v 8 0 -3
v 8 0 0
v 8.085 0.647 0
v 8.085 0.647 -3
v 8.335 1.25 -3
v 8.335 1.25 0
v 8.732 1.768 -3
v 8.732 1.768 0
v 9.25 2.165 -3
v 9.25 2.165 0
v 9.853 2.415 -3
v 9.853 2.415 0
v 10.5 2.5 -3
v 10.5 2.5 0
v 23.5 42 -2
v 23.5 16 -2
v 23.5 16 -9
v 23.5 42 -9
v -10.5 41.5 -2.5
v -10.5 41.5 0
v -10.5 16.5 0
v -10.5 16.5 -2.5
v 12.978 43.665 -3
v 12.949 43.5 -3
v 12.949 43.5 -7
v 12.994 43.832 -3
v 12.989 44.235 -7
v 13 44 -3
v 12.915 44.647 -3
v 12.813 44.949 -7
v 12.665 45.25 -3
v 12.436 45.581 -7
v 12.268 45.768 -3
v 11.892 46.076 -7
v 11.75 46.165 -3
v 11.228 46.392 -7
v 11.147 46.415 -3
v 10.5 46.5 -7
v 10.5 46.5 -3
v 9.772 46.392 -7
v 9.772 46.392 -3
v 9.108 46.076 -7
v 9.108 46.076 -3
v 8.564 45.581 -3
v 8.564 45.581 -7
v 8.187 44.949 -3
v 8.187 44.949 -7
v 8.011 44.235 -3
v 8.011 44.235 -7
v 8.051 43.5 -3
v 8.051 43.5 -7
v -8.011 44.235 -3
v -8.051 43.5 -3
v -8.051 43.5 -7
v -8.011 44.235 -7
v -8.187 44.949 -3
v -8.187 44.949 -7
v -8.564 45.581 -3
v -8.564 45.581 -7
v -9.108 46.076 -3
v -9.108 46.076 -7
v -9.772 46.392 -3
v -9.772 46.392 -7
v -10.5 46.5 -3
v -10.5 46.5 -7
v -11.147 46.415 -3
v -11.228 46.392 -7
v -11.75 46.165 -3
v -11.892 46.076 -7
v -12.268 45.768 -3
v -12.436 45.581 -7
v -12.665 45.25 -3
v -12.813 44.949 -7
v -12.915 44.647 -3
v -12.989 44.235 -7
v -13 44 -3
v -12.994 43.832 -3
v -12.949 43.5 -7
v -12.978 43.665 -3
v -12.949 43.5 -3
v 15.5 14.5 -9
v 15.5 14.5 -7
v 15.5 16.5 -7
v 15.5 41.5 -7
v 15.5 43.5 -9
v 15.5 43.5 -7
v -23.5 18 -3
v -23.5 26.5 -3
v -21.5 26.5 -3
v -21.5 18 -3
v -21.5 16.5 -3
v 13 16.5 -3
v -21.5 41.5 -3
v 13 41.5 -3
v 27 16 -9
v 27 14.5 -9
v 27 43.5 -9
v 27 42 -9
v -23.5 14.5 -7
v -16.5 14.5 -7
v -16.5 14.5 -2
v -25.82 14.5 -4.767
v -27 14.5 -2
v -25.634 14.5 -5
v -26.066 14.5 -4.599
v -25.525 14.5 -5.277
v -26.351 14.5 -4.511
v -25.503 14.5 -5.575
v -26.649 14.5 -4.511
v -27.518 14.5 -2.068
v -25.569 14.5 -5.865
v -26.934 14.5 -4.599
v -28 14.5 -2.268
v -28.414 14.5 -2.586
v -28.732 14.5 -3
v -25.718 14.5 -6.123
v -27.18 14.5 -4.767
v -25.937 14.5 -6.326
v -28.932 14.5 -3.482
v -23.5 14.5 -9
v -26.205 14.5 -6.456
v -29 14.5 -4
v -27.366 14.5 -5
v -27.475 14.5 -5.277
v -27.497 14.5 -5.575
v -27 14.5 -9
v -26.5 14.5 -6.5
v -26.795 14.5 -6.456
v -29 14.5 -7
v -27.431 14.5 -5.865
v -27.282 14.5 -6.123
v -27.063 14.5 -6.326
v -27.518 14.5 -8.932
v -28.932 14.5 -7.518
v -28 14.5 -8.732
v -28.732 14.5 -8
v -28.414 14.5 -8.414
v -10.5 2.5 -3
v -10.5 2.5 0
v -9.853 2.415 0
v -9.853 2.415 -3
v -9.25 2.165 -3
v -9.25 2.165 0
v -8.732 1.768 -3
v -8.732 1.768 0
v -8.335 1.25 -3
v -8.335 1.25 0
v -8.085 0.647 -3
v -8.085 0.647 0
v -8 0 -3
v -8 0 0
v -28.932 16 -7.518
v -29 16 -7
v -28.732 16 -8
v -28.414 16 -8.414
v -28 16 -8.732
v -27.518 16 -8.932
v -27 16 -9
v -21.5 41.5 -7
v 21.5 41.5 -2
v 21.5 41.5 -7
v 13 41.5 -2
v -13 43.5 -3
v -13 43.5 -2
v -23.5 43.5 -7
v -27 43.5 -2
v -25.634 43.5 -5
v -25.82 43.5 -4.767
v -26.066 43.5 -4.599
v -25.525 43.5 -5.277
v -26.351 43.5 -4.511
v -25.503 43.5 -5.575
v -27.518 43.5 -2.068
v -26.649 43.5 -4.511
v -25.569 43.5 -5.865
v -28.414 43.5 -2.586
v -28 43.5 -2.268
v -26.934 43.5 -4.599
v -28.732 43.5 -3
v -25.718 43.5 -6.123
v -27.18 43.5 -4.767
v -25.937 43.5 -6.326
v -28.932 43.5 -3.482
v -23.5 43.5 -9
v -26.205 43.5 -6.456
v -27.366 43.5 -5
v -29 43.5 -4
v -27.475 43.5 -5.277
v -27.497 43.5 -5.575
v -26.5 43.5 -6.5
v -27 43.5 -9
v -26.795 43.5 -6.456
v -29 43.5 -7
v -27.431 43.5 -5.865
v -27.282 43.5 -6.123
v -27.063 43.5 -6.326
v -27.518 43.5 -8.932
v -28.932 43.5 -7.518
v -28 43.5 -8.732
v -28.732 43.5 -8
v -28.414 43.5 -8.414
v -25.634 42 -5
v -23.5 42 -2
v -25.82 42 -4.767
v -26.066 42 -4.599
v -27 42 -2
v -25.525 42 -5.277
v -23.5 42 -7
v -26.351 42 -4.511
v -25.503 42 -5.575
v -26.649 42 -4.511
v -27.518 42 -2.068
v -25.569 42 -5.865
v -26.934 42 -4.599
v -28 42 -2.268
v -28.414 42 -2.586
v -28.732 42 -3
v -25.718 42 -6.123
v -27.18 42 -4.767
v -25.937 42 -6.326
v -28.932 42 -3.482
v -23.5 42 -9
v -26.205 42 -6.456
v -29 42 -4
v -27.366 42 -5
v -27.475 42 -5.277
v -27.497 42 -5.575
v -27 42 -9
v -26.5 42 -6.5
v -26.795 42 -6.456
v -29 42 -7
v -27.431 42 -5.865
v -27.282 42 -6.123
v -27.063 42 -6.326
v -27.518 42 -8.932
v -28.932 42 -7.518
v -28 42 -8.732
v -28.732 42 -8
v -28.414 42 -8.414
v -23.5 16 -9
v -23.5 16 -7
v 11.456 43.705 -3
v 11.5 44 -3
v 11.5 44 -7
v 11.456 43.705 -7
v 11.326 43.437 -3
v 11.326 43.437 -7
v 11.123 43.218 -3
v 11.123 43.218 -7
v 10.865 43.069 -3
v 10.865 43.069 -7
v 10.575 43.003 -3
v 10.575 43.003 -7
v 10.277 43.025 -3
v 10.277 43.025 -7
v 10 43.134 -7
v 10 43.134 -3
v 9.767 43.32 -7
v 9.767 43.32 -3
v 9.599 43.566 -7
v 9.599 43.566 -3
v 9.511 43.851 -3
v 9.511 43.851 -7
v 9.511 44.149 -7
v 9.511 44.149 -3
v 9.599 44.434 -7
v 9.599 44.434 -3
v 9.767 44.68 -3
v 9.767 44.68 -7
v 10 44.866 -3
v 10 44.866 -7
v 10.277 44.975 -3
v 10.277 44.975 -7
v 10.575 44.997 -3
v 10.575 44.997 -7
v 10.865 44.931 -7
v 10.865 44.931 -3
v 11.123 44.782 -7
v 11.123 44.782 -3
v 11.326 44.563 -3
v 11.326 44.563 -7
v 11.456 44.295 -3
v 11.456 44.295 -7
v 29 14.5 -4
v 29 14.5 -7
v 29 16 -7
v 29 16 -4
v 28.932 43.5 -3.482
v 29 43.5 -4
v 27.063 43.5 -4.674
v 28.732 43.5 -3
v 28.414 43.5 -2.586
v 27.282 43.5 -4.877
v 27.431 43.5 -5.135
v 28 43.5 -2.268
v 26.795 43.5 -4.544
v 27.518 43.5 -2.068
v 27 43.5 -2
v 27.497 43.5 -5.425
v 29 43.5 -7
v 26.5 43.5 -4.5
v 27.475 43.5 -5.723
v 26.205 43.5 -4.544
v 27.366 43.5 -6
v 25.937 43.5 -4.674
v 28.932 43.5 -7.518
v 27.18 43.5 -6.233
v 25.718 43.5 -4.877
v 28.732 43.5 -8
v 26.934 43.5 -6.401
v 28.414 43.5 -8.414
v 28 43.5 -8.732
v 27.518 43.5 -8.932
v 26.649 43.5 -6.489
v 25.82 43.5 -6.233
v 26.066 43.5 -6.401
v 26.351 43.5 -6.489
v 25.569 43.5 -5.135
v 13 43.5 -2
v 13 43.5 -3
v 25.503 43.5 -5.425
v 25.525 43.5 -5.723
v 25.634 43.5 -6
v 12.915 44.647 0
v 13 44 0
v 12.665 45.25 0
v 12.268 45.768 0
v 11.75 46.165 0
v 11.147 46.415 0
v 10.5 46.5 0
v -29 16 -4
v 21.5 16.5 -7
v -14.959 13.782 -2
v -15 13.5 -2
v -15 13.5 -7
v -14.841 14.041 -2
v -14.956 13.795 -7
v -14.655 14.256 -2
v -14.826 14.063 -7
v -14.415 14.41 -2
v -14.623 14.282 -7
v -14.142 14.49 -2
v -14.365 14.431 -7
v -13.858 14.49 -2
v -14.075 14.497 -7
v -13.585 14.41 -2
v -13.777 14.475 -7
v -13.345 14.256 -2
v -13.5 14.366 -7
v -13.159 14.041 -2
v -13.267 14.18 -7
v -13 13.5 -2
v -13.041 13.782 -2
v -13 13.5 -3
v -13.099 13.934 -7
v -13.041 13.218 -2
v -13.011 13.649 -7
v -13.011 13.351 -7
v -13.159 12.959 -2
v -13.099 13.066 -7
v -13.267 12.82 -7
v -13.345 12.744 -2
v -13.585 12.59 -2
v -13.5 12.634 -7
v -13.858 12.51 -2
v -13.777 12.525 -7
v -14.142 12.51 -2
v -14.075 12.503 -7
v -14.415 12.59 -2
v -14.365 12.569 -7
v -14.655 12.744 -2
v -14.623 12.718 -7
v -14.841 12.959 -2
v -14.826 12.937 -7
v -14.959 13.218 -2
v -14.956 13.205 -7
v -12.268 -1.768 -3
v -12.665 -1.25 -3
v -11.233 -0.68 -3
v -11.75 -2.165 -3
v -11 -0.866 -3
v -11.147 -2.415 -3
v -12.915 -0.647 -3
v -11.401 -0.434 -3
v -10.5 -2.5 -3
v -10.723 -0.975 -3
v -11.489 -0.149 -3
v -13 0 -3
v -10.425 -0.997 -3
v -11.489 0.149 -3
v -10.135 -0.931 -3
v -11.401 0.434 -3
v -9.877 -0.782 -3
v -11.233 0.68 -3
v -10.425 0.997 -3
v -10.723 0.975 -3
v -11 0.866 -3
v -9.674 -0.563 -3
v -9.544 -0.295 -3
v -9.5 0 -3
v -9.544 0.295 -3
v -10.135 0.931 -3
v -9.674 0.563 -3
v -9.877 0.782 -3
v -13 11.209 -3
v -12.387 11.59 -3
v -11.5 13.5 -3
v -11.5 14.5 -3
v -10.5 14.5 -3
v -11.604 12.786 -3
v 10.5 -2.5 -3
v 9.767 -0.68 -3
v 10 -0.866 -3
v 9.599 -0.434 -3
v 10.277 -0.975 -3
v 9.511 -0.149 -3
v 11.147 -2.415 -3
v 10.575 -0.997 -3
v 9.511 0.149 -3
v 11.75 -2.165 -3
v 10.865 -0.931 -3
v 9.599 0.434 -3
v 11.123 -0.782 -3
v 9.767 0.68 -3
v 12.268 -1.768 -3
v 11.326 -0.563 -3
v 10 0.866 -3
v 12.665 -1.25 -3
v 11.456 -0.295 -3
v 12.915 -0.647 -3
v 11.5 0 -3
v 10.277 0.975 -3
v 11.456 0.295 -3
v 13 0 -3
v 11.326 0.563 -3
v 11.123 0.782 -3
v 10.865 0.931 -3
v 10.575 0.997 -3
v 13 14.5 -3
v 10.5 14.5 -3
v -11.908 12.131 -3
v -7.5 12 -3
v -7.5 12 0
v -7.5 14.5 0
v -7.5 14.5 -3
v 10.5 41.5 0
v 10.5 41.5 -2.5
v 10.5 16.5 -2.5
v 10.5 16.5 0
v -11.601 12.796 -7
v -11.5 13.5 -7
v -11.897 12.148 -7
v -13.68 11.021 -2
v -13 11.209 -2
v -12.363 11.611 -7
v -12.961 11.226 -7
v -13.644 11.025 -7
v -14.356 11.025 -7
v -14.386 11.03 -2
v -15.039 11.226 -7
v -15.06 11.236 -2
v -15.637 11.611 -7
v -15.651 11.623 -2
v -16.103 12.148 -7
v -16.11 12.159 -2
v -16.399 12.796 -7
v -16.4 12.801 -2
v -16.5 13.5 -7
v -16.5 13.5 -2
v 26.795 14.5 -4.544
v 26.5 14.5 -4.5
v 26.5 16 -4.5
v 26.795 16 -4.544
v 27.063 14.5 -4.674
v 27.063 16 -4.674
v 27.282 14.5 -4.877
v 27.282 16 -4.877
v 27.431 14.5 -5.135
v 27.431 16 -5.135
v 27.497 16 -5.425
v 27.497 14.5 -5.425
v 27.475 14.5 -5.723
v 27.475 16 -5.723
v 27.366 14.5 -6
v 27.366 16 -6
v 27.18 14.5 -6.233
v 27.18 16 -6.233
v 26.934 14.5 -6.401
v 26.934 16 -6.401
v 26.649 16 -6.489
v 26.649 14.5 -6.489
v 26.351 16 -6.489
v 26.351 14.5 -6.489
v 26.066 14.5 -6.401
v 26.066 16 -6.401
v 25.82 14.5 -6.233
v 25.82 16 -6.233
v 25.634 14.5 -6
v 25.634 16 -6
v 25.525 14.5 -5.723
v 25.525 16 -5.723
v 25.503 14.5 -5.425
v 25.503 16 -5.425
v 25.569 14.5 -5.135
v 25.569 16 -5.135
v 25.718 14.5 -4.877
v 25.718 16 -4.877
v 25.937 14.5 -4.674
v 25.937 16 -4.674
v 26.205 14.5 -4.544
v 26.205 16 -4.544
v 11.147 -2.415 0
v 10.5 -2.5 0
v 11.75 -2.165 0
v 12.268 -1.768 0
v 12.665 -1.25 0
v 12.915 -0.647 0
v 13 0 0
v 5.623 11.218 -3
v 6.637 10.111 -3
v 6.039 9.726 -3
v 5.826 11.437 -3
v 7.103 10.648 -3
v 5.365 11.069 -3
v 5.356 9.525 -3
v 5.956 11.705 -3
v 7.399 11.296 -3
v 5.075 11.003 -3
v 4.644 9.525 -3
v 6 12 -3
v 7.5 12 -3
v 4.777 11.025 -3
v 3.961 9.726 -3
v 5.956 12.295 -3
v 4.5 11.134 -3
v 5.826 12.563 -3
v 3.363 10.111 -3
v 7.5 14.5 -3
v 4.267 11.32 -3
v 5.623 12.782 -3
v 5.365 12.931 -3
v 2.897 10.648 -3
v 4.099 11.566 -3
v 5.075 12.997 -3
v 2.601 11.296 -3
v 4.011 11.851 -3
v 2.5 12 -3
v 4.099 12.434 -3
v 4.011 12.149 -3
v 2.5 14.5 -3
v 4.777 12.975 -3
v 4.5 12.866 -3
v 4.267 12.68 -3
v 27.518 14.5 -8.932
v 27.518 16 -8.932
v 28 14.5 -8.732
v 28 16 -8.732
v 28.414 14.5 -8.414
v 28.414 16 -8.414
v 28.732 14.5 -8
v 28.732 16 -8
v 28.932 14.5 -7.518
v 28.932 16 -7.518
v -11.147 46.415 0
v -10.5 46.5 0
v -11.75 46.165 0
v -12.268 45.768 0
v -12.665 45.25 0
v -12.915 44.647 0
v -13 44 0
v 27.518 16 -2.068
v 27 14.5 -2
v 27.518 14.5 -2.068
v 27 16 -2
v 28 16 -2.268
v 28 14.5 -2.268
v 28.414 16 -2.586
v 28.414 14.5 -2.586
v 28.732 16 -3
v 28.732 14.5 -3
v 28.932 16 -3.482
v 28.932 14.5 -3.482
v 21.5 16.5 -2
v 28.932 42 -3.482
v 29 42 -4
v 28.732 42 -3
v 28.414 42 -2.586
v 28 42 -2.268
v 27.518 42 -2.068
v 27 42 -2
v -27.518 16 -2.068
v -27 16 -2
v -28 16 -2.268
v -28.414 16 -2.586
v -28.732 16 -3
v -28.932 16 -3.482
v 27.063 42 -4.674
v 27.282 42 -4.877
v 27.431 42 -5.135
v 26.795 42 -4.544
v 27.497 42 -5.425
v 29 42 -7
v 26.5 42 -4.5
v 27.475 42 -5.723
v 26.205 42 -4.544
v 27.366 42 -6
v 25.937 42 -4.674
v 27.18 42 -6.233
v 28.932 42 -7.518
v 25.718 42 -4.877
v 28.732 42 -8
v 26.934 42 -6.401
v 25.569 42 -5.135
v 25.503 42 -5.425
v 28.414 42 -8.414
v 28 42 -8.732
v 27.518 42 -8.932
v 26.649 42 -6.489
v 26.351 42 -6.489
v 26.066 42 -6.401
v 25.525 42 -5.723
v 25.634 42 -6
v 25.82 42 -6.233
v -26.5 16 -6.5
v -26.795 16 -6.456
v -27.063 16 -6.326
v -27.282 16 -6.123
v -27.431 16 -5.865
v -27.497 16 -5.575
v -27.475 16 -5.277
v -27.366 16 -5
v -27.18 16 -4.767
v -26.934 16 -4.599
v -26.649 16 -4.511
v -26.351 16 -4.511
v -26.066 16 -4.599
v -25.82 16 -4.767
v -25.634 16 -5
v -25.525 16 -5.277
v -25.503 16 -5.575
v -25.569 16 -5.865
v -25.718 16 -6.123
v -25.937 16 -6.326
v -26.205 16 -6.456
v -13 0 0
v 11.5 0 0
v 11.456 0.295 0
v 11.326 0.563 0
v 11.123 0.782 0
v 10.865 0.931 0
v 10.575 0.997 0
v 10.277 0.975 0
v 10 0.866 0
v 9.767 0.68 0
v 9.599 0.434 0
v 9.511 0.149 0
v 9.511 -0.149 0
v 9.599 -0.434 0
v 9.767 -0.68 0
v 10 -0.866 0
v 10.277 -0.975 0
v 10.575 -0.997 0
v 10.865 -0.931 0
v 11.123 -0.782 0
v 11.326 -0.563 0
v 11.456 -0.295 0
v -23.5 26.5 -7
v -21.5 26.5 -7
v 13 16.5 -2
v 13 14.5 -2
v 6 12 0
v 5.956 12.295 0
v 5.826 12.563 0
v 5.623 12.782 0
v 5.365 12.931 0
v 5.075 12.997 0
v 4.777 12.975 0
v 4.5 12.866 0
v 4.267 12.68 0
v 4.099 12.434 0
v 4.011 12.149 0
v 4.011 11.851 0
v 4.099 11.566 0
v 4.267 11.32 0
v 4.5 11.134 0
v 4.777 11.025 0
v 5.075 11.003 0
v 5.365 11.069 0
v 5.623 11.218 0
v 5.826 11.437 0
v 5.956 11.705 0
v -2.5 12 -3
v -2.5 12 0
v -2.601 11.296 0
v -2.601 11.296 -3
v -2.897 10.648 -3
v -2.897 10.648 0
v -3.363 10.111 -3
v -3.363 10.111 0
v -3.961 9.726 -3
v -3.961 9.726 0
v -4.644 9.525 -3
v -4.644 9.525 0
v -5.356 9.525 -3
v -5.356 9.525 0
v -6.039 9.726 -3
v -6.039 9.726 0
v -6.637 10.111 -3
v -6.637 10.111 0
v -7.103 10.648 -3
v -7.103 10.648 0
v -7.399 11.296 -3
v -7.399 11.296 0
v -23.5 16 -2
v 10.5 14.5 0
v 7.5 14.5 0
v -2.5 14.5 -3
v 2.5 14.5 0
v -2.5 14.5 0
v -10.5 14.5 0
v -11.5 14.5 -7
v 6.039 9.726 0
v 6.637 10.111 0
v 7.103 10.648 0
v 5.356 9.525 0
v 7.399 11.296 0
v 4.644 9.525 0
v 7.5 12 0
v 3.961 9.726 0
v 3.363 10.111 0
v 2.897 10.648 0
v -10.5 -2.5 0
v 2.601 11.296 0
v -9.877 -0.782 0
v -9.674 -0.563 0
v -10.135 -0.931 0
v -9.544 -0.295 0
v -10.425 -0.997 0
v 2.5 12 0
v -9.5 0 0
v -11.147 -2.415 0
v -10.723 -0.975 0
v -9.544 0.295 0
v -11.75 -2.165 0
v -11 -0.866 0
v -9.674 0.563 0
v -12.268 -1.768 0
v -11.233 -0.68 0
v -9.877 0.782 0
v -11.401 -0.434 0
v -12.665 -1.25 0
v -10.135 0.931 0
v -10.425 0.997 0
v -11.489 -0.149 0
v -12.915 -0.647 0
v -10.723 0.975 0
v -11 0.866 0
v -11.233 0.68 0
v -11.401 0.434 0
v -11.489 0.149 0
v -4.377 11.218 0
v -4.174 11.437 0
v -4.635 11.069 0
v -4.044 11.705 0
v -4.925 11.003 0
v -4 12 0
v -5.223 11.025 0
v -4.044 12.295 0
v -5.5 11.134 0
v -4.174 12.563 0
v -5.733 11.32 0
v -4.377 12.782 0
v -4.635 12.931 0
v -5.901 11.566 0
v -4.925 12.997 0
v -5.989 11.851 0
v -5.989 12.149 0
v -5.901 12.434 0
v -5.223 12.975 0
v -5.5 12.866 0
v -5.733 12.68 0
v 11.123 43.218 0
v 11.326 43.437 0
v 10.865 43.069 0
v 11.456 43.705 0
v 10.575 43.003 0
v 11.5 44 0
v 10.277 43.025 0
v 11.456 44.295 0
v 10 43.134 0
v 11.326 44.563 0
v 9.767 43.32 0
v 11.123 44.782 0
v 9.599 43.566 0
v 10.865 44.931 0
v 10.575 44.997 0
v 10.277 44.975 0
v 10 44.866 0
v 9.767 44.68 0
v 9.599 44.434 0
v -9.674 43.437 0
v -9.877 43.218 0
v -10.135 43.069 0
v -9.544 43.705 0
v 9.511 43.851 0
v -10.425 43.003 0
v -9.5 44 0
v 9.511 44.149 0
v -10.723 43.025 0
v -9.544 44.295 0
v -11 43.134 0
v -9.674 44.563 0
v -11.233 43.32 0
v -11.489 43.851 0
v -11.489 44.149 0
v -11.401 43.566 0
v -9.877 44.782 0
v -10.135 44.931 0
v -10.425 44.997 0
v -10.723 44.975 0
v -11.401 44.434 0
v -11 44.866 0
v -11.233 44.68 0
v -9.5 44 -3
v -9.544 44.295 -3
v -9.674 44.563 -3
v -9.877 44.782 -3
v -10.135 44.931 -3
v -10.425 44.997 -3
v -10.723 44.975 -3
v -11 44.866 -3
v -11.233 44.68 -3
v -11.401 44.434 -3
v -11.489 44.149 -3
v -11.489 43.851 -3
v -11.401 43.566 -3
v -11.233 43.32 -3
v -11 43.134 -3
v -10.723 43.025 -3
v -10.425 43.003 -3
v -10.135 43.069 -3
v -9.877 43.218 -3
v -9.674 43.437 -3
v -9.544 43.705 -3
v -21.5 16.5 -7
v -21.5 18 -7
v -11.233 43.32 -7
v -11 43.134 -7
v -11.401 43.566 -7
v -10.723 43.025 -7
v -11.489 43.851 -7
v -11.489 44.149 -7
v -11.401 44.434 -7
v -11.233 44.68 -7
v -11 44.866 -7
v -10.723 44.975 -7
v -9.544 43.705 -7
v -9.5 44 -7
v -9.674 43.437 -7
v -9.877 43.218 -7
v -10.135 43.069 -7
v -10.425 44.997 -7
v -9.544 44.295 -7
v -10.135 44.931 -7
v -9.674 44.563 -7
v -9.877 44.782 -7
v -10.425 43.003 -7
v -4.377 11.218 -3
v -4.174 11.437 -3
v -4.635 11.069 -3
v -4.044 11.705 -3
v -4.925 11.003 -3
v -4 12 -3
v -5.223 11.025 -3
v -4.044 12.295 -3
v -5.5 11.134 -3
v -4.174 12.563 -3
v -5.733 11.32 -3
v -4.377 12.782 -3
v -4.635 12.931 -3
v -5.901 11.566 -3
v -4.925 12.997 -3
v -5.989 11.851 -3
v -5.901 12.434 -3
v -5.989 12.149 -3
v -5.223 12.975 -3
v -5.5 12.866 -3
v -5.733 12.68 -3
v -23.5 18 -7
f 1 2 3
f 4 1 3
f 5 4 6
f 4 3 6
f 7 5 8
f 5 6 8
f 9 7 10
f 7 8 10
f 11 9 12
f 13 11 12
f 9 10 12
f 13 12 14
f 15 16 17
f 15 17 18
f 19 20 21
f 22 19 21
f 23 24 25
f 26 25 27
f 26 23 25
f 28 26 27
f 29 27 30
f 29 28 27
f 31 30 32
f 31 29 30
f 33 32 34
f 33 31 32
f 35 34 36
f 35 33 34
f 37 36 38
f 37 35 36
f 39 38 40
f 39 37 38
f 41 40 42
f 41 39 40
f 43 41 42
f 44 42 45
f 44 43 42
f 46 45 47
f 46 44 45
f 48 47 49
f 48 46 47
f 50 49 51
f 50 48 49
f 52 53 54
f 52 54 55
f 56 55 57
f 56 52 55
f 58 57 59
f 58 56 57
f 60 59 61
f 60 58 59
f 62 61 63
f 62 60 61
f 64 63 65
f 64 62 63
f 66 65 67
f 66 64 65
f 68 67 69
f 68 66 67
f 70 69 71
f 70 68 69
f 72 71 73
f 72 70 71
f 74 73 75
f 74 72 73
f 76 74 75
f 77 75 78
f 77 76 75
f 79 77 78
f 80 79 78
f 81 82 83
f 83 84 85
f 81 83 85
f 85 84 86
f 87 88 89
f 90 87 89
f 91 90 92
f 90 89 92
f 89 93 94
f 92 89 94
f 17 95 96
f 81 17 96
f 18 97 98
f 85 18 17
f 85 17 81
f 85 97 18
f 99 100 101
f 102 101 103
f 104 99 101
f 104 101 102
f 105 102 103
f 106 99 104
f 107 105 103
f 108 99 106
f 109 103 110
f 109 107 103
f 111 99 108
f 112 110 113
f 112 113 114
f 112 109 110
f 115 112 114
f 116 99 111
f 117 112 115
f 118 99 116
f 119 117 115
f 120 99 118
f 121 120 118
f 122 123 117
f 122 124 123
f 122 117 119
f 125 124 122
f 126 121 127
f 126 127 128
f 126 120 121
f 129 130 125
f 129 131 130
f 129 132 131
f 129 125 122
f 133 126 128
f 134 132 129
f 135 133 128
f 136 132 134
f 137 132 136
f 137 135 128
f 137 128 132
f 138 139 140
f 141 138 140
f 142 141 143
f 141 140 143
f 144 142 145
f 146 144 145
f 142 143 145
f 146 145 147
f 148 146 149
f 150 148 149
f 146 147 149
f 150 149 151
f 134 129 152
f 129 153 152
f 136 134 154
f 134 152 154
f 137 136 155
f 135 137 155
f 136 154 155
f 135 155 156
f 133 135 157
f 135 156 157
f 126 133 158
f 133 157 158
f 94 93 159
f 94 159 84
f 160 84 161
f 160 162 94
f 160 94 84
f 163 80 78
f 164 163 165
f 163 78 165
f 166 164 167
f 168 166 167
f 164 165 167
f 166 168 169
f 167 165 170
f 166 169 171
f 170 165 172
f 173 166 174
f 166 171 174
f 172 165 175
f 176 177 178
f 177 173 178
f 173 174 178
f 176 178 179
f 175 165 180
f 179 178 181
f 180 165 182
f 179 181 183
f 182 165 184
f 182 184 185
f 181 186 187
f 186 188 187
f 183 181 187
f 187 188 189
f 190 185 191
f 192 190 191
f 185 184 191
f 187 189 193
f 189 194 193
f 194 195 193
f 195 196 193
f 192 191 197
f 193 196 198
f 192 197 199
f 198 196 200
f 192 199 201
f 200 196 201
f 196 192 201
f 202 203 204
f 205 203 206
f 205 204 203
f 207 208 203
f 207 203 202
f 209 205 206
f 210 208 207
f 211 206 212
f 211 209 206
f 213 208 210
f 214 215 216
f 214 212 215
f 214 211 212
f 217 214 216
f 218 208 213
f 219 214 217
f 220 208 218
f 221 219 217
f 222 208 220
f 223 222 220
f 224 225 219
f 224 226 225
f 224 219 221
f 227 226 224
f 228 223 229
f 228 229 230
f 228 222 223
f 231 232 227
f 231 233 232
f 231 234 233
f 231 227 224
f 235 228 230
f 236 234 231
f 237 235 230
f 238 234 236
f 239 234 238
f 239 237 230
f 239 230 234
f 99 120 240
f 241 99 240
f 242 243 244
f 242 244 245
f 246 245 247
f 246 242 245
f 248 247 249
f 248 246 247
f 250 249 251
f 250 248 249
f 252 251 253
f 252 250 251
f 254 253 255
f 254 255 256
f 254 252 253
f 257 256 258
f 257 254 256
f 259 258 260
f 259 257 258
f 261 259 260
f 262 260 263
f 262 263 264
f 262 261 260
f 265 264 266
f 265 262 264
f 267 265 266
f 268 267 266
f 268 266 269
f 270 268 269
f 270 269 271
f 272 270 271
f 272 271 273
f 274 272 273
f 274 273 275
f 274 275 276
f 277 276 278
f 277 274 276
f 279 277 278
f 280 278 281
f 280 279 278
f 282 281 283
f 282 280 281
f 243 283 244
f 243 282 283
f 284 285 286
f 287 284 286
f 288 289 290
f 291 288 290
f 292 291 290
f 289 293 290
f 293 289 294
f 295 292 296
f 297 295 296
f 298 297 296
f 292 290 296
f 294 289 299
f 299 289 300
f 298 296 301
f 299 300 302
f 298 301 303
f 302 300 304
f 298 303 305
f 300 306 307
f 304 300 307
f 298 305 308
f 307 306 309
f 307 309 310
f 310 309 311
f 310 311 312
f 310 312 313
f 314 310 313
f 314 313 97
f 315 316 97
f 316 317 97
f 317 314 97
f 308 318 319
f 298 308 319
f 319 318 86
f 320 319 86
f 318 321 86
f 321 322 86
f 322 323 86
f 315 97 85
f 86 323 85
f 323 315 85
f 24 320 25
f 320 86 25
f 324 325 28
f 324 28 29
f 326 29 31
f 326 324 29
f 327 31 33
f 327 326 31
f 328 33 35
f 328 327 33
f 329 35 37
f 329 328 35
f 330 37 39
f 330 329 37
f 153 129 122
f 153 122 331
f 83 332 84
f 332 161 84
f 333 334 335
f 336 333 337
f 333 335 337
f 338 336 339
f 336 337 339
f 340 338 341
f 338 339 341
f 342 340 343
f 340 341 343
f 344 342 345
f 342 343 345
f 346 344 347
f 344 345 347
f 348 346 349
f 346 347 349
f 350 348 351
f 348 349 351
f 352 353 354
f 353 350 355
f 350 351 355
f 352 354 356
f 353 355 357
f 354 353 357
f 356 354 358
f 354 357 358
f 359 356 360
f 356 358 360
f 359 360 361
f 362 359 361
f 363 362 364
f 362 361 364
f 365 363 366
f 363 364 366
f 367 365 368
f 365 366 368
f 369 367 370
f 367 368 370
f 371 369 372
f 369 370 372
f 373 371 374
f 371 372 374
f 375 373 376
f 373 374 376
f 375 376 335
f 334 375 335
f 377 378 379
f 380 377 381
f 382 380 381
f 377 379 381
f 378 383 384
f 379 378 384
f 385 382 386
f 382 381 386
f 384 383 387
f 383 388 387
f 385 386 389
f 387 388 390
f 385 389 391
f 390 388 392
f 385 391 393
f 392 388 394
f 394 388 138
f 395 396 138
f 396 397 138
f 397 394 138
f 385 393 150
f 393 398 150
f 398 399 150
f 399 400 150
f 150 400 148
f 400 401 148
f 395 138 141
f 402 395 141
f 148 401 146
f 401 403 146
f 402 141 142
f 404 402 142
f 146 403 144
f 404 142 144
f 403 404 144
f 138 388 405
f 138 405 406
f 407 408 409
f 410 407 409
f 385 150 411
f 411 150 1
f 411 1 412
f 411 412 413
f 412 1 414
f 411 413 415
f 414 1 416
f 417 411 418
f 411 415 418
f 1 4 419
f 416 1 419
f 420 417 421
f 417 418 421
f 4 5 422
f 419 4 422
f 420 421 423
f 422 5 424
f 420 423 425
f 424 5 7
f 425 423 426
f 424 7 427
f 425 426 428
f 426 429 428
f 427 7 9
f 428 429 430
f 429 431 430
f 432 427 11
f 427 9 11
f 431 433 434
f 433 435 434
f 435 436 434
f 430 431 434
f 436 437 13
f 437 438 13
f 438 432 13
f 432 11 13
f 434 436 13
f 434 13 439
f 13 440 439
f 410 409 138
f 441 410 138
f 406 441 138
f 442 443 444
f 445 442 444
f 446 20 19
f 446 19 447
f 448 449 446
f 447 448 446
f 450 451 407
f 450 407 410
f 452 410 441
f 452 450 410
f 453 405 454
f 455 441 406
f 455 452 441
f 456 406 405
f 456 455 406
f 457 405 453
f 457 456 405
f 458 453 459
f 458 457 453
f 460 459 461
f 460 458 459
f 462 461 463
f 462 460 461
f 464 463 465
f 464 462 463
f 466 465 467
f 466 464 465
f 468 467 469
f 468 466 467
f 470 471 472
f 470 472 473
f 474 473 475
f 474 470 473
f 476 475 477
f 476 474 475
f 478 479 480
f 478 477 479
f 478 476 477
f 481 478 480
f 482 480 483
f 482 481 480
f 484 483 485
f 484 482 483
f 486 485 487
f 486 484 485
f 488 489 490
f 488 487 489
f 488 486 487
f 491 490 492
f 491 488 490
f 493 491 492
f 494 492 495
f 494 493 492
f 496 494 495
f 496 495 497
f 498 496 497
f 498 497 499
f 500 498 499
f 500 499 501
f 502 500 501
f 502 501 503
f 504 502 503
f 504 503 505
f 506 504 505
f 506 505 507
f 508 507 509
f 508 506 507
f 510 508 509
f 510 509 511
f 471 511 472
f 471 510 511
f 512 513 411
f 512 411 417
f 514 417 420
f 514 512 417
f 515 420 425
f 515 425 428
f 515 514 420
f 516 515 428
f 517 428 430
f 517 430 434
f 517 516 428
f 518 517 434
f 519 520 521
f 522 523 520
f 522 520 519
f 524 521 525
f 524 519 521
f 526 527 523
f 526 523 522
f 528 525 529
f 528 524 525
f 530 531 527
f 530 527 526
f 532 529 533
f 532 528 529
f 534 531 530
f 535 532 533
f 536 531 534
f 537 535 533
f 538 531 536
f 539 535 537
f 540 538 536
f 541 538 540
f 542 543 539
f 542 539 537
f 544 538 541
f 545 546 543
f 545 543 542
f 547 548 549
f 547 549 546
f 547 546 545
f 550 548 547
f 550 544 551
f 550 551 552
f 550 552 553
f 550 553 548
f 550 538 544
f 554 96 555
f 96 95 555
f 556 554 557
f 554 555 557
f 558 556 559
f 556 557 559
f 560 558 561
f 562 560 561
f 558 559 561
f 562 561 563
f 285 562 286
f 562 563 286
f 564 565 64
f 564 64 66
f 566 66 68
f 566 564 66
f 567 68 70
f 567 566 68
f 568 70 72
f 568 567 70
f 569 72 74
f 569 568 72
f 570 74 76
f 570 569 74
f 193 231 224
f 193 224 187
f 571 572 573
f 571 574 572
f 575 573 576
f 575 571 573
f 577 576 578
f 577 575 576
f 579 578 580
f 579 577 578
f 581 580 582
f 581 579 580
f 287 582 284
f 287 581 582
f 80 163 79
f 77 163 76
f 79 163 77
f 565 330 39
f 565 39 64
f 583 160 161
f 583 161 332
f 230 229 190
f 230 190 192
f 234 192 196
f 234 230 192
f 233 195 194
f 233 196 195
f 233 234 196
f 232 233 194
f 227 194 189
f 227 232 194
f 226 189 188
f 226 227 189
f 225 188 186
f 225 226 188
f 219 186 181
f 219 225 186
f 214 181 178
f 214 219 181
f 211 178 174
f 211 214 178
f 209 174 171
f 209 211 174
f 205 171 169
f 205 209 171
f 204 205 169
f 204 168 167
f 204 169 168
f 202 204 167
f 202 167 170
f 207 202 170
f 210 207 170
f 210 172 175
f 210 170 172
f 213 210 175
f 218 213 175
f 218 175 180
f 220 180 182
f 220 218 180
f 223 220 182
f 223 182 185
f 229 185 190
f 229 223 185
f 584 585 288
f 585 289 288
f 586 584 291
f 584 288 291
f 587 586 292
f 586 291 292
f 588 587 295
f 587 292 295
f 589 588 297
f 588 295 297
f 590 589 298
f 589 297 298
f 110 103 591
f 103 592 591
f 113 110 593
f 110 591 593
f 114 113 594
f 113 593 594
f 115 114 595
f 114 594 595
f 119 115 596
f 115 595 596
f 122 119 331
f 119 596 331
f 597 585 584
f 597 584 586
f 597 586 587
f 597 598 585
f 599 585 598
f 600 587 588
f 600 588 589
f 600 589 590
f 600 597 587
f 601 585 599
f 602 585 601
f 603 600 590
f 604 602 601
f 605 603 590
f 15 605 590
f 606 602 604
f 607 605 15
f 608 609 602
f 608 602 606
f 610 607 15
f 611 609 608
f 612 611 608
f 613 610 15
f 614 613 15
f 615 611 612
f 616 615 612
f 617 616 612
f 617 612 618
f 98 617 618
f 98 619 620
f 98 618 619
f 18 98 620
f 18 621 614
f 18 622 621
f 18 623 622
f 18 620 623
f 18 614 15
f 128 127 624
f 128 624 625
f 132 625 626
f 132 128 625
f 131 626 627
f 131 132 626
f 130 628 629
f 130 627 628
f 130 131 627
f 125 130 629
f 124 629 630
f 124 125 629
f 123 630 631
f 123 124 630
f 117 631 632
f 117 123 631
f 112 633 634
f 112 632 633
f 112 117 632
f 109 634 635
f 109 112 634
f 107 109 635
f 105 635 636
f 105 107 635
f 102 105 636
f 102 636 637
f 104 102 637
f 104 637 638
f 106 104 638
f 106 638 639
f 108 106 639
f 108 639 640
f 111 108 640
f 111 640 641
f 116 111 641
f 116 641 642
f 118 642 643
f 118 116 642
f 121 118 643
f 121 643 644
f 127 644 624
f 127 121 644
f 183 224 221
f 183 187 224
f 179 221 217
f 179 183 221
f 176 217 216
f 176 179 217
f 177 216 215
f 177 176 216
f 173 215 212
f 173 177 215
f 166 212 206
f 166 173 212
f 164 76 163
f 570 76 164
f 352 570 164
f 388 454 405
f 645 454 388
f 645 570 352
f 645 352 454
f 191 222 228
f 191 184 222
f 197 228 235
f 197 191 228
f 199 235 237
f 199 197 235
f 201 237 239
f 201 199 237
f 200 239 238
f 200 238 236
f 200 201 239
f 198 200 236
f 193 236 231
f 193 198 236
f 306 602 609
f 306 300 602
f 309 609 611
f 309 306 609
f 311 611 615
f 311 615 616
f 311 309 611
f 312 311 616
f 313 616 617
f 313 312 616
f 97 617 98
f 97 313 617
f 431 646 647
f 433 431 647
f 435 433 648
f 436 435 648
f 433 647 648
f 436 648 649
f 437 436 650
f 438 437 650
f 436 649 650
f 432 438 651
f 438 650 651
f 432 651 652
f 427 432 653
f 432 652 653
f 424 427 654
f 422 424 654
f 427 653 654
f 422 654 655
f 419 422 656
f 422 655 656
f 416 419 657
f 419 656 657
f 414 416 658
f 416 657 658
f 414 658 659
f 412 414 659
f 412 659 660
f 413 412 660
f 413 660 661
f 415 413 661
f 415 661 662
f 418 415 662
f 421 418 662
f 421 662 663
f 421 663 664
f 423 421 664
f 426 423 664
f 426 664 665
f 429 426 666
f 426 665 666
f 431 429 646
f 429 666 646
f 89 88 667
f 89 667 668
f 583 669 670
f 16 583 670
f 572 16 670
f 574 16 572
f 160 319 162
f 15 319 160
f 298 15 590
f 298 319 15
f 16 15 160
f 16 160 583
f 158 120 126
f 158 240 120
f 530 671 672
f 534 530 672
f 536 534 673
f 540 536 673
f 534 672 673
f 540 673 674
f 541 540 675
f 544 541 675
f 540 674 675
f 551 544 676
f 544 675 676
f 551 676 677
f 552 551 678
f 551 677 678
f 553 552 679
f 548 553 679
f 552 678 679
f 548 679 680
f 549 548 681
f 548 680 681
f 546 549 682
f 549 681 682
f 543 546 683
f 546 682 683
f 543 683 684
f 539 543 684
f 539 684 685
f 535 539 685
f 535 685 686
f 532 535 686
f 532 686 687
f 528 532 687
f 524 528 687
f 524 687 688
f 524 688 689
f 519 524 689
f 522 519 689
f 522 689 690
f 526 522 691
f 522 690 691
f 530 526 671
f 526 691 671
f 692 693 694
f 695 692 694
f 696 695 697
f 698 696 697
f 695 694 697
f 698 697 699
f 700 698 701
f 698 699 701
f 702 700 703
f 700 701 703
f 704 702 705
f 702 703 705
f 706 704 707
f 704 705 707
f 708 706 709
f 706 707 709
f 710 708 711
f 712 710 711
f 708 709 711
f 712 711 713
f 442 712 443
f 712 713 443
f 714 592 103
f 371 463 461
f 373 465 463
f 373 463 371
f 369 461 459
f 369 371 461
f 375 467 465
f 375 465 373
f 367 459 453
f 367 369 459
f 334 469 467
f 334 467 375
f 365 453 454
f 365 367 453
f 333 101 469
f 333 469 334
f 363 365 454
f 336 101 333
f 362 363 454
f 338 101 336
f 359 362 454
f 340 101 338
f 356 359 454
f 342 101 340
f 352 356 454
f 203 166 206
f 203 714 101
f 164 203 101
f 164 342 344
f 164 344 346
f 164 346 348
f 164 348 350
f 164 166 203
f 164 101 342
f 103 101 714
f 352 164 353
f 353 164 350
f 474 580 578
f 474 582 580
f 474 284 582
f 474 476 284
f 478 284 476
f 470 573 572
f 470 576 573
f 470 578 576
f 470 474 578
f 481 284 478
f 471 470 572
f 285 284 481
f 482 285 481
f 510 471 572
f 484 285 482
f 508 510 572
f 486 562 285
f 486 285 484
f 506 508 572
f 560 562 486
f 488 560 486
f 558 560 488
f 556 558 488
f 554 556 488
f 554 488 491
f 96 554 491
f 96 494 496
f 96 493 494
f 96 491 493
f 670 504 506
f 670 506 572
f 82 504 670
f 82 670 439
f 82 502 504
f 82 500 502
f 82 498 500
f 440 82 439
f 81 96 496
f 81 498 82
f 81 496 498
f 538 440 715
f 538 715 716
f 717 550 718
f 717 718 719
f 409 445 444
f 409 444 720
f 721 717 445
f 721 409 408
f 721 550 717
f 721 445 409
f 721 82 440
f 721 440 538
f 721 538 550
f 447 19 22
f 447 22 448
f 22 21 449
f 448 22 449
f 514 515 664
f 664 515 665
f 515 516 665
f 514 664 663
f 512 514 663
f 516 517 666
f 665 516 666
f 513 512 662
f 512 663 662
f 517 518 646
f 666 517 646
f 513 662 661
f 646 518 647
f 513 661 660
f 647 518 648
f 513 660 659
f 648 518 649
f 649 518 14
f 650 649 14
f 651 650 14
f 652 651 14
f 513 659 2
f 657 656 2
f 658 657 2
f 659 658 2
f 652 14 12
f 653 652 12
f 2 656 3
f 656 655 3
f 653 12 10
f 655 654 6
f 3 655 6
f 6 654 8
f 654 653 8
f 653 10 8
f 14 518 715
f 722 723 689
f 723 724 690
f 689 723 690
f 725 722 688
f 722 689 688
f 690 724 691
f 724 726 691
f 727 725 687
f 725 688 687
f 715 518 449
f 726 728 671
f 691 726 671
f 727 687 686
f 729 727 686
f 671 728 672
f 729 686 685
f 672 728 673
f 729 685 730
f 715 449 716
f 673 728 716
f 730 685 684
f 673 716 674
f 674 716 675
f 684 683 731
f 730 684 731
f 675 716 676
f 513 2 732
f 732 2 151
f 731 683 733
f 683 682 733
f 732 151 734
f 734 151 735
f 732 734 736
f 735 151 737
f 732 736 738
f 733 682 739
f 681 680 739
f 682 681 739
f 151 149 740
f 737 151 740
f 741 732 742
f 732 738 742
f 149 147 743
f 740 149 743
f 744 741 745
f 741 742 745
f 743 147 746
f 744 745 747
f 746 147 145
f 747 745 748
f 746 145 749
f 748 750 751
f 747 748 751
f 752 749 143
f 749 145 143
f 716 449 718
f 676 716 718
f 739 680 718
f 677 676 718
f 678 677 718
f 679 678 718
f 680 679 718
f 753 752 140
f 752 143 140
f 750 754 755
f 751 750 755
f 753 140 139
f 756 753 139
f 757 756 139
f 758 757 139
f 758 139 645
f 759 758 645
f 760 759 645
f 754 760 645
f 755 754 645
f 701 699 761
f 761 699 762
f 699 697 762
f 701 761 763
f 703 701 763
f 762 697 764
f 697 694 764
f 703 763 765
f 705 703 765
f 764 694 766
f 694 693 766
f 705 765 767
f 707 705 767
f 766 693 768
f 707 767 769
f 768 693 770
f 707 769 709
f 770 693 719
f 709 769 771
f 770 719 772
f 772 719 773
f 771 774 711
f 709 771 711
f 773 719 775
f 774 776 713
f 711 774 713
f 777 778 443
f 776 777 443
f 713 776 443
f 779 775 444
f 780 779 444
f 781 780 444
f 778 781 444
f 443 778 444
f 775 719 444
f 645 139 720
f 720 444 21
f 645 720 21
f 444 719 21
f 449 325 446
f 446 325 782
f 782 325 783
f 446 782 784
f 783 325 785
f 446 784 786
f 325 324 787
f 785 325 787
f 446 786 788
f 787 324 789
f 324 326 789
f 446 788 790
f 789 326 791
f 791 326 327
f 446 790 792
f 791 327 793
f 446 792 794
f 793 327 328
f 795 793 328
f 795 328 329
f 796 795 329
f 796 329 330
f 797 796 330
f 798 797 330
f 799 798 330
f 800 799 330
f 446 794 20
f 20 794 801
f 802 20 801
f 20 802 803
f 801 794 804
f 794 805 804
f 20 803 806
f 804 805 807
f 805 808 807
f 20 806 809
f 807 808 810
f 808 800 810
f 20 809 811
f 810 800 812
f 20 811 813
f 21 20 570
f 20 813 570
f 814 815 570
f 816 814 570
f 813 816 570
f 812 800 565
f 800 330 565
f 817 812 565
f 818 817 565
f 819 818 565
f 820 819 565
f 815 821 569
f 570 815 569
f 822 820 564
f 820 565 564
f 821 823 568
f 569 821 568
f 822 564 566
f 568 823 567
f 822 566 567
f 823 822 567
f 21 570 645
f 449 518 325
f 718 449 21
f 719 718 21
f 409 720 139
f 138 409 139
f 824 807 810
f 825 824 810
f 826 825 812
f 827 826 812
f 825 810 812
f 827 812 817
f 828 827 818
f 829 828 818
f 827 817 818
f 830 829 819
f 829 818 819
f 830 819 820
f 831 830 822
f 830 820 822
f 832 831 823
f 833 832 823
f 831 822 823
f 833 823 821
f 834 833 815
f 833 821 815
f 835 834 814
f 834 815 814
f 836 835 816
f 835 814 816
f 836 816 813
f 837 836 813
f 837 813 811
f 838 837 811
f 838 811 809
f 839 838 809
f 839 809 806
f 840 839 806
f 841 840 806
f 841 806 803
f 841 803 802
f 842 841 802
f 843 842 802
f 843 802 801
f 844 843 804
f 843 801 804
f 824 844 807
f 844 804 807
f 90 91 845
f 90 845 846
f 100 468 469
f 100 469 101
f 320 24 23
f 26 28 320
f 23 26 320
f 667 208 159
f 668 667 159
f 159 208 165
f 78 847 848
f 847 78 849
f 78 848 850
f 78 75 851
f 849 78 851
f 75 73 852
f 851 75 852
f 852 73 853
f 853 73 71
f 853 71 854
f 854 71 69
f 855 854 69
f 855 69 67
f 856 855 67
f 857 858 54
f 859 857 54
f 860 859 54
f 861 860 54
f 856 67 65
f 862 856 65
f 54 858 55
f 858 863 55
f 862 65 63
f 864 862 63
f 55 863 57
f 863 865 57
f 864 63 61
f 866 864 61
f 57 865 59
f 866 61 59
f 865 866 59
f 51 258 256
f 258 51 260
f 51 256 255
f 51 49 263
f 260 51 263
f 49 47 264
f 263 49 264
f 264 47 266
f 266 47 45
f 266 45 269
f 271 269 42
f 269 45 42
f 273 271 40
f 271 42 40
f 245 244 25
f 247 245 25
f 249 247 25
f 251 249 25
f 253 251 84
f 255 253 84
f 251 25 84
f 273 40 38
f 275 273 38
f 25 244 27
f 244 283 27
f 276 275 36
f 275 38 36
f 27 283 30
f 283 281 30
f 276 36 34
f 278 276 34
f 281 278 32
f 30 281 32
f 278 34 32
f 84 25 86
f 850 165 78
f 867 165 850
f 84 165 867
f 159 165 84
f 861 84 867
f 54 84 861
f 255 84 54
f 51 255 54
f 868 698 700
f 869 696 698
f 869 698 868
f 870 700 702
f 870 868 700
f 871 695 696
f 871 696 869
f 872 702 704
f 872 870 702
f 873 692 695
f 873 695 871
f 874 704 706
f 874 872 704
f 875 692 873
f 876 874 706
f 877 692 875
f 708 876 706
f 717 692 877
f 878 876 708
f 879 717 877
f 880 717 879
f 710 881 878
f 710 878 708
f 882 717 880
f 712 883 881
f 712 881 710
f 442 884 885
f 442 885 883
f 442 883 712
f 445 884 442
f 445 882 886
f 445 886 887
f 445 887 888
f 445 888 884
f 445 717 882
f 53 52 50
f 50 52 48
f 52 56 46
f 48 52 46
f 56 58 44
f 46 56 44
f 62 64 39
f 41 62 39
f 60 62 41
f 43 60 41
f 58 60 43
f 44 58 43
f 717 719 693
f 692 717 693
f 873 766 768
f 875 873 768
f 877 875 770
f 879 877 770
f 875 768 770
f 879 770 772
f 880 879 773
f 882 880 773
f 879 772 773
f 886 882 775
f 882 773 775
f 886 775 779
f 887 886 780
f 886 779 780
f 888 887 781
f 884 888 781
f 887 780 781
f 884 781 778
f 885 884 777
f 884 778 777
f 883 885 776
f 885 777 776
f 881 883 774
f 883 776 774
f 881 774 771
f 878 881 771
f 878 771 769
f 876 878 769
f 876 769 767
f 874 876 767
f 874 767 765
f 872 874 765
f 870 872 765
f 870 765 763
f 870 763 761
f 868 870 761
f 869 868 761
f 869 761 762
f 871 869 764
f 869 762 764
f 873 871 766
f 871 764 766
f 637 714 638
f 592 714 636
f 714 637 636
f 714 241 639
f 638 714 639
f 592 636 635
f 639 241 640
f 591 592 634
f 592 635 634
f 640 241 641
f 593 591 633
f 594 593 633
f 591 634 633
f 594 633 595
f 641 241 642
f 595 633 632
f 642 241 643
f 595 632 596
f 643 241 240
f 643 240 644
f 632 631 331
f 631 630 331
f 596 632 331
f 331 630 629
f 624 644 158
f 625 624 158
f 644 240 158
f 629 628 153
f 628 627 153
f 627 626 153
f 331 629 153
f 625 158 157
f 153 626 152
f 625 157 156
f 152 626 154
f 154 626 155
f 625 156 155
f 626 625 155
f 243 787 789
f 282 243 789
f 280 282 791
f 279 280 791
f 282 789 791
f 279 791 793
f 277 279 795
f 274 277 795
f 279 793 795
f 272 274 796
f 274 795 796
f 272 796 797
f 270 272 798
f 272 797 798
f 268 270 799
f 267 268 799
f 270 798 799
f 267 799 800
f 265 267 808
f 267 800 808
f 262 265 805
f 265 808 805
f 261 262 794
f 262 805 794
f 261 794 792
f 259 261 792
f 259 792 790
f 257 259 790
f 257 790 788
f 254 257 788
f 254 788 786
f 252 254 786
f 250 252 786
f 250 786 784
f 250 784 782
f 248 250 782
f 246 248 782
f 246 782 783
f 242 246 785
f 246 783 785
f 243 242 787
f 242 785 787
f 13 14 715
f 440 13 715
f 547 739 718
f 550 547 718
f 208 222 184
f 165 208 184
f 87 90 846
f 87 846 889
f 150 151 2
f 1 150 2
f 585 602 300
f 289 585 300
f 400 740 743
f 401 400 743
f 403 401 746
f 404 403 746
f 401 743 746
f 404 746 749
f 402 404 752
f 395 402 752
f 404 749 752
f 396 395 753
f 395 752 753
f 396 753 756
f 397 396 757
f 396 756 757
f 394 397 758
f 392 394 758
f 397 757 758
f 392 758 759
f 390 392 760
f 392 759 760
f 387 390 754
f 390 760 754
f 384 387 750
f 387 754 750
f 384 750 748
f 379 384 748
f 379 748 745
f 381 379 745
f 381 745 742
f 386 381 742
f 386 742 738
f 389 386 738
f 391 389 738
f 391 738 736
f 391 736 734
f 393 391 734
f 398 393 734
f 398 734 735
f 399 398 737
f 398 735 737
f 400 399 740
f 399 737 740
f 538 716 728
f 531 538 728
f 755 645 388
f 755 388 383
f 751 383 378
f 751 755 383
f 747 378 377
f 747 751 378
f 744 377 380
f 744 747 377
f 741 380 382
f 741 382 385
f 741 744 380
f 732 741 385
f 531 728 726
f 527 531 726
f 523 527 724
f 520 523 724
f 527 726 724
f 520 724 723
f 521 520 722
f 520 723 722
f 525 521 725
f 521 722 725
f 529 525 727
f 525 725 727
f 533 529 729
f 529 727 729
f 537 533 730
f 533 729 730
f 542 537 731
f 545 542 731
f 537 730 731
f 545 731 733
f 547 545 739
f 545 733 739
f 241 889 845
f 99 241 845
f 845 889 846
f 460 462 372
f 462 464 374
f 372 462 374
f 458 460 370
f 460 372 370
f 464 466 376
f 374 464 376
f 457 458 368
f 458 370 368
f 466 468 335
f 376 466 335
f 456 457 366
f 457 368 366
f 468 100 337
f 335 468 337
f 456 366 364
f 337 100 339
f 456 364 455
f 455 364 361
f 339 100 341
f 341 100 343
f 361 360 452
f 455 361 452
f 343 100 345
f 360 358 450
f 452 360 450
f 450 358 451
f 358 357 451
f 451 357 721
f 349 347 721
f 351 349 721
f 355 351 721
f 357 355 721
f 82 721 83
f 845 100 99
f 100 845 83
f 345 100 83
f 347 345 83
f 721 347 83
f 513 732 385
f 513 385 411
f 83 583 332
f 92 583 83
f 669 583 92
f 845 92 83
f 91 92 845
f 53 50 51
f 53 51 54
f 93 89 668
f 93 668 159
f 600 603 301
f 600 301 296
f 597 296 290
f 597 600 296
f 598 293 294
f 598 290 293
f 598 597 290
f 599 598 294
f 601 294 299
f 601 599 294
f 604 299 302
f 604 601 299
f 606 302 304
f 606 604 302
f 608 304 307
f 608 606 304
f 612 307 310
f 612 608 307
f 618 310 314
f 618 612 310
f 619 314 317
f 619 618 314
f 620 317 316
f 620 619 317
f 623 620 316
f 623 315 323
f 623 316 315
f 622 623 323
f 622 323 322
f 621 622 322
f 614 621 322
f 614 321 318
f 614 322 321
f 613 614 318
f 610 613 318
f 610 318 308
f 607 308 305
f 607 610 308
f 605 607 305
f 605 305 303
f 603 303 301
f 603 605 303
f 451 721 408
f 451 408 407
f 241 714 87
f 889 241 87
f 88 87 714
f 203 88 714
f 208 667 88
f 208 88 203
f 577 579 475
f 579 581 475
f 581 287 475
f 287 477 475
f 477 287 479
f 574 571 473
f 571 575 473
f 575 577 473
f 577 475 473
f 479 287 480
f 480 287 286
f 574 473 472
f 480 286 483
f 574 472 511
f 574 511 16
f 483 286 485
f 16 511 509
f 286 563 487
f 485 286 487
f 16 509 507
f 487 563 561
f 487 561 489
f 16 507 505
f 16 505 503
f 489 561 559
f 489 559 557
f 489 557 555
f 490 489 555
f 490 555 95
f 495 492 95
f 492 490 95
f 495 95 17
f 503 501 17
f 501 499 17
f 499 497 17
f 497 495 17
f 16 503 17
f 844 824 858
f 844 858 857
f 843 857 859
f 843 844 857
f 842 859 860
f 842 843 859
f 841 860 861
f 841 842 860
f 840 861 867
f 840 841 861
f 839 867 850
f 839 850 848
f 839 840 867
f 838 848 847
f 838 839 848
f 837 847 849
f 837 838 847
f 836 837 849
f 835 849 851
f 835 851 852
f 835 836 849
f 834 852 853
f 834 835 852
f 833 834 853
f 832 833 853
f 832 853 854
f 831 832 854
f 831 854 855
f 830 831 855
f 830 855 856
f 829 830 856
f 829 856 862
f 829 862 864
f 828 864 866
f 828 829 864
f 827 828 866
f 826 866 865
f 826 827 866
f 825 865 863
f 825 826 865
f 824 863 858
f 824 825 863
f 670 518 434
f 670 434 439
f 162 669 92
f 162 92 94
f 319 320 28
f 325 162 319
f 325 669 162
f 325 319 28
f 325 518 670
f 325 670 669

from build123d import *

# Parameters (mm, degrees)
SKETCH1_R                        = 1
ESP_BRACKET_DEPTH                = 3
SKETCH2_R                        = 1
LORA_HOLDER_SIDES_DEPTH          = 4
SKETCH9_W                        = 21
SKETCH9_H                        = 27
LORA_BACKING_ADD_MPU_HOLE_DEPTH  = 0.5
SKETCH4_W                        = 8
SKETCH4_H                        = 29
LORA_CONNECTOR_COVER_DEPTH       = 2
SKETCH6_W                        = 10.5
SKETCH6_H                        = 29
OTHER_SIDE_LORA_COVER_DEPTH      = 1
LORA_CLAMP_THIRD_SCREWHOLE_REACH = 54.569
SKETCH7_R                        = 1
SKETCH10_R                       = 1
BAROMETER_MOUNT_DEPTH            = 3
ALL_TABS_EXTRUDE_SIDEWAYS_REACH  = 54.872
SKETCH11_W                       = 5.5
SKETCH11_H                       = 1.5
SCREWHOLE_CUT_DEPTH              = 56.118055118
SCREWHOLE_CUT_DEPTH_BACK         = 56.118055118
SKETCH14_R                       = 1
SCREWHOLE_TAB_FILLETS_R          = 2


with BuildPart() as part:
    # Sketch1 → ESP Bracket (new body)
    with BuildSketch(Plane.XY):
        with BuildLine():
            Line((-13, 44), (-13, 0))
            ThreePointArc((-13, 0), (-12.267766953, -1.767766953), (-10.5, -2.5))
            Line((-10.5, -2.5), (10.5, -2.5))
            ThreePointArc((10.5, -2.5), (12.267766953, -1.767766953), (13, 0))
            Line((13, 0), (13, 44))
            ThreePointArc((13, 44), (12.267766953, 45.767766953), (10.5, 46.5))
            Line((10.5, 46.5), (-10.5, 46.5))
            ThreePointArc((-10.5, 46.5), (-12.267766953, 45.767766953), (-13, 44))
        make_face()
        with Locations((-10.5, 44)):
            Circle(SKETCH1_R, mode=Mode.SUBTRACT)
        with Locations((10.5, 44)):
            Circle(SKETCH1_R, mode=Mode.SUBTRACT)
        with Locations((10.5, 0)):
            Circle(SKETCH1_R, mode=Mode.SUBTRACT)
        with Locations((-10.5, 0)):
            Circle(SKETCH1_R, mode=Mode.SUBTRACT)
        with BuildLine():
            Line((-10.5, 41.5), (-10.5, 2.5))
            ThreePointArc((-10.5, 2.5), (-8.732233047, 1.767766953), (-8, 0))
            Line((-8, 0), (8, 0))
            ThreePointArc((8, 0), (8.732233047, 1.767766953), (10.5, 2.5))
            Line((10.5, 2.5), (10.5, 41.5))
            Line((10.5, 41.5), (-10.5, 41.5))
        make_face(mode=Mode.SUBTRACT)
    extrude(amount=-ESP_BRACKET_DEPTH)

    # Sketch2 → LoRa Holder Sides (add)
    with BuildSketch(Plane(origin=(0, 0, -3), x_dir=(-1, 0, 0), z_dir=(0, 0, -1))):
        with BuildLine():
            Line((-8.050510257, 43.5), (8.050510257, 43.5))
            ThreePointArc((8.050510257, 43.5), (10.5, 46.5), (12.949489743, 43.5))
            Line((12.949489743, 43.5), (23.5, 43.5))
            Line((23.5, 43.5), (23.5, 26.5))
            Line((23.5, 26.5), (21.5, 26.5))
            Line((21.5, 26.5), (21.5, 41.5))
            Line((21.5, 41.5), (-21.5, 41.5))
            Line((-21.5, 41.5), (-21.5, 16.5))
            Line((-21.5, 16.5), (21.5, 16.5))
            Line((21.5, 16.5), (21.5, 18))
            Line((21.5, 18), (23.5, 18))
            Line((23.5, 18), (23.5, 16.5))
            Line((23.5, 16.5), (23.5, 14.5))
            Line((23.5, 14.5), (-23.5, 14.5))
            Line((-23.5, 14.5), (-23.5, 43.5))
            Line((-23.5, 43.5), (-12.949489743, 43.5))
            ThreePointArc((-12.949489743, 43.5), (-10.5, 46.5), (-8.050510257, 43.5))
        make_face()
        with Locations(Location((-10.5, 44, 0), (0, 0, 180))):
            Circle(SKETCH2_R, mode=Mode.SUBTRACT)
        with Locations(Location((10.5, 44, 0), (0, 0, 180))):
            Circle(SKETCH2_R, mode=Mode.SUBTRACT)
    extrude(amount=LORA_HOLDER_SIDES_DEPTH)

    # Sketch9 → LoRa Backing (ADD MPU HOLE) (add)
    with BuildSketch(Plane.XY.offset(-3)):
        with Locations((0, 28)):
            Rectangle(SKETCH9_W, SKETCH9_H)
    extrude(amount=LORA_BACKING_ADD_MPU_HOLE_DEPTH)

    # Sketch4 → LoRa Connector Cover (add)
    with BuildSketch(Plane(origin=(0, 0, -7), x_dir=(-1, 0, 0), z_dir=(0, 0, -1))):
        with Locations((-19.5, 29)):
            Rectangle(SKETCH4_W, SKETCH4_H)
    extrude(amount=LORA_CONNECTOR_COVER_DEPTH)

    # Sketch6 → Other Side LoRa Cover (add)
    with BuildSketch(Plane.XY.offset(-3)):
        with Locations((-18.25, 29)):
            Rectangle(SKETCH6_W, SKETCH6_H)
        Polygon((13, 16.5), (13, 14.5), (23.5, 14.5), (23.5, 43.5), (13, 43.5), (13, 41.5), (21.5, 41.5), (21.5, 16.5), align=None)
    extrude(amount=OTHER_SIDE_LORA_COVER_DEPTH)

    # LoRa Clamp Third Screwhole: up to this face of the body (flat: up to its plane)
    lora_clamp_third_screwhole_end = Plane(part.part.faces().sort_by_distance((-18.25, 29, -2))[0])
    # Sketch7 → LoRa Clamp Third Screwhole (add, up to the picked face)
    with BuildSketch(Plane(origin=(0, 0, -7), x_dir=(-1, 0, 0), z_dir=(0, 0, -1)), mode=Mode.PRIVATE) as lora_clamp_third_screwhole_sk1:
        with BuildLine():
            Line((16.5, 16.5), (11.5, 16.5))
            Line((11.5, 16.5), (11.5, 13.5))
            ThreePointArc((11.5, 13.5), (14, 11), (16.5, 13.5))
            Line((16.5, 13.5), (16.5, 16.5))
        make_face()
        with Locations((14, 13.5)):
            Circle(SKETCH7_R, mode=Mode.SUBTRACT)
    lora_clamp_third_screwhole_tool1 = split(extrude(lora_clamp_third_screwhole_sk1.sketch, amount=-LORA_CLAMP_THIRD_SCREWHOLE_REACH, mode=Mode.PRIVATE), bisect_by=lora_clamp_third_screwhole_end, keep=Keep.BOTH, mode=Mode.PRIVATE)
    add(lora_clamp_third_screwhole_tool1.solids().sort_by(Axis((-14, 16.42567, -7), (0, 0, 1)))[0])

    # Sketch10 → Barometer Mount (add)
    with BuildSketch(Plane.XY):
        with BuildLine():
            Line((-10.5, 16.5), (10.5, 16.5))
            Line((10.5, 16.5), (10.5, 14.5))
            Line((10.5, 14.5), (7.5, 14.5))
            Line((7.5, 14.5), (7.5, 12))
            ThreePointArc((7.5, 12), (5, 9.5), (2.5, 12))
            Line((2.5, 12), (2.5, 14.5))
            Line((2.5, 14.5), (-2.5, 14.5))
            Line((-2.5, 14.5), (-2.5, 12))
            ThreePointArc((-2.5, 12), (-5, 9.5), (-7.5, 12))
            Line((-7.5, 12), (-7.5, 14.5))
            Line((-7.5, 14.5), (-10.5, 14.5))
            Line((-10.5, 14.5), (-10.5, 16.5))
        make_face()
        with Locations((-5, 12)):
            Circle(SKETCH10_R, mode=Mode.SUBTRACT)
        with Locations((5, 12)):
            Circle(SKETCH10_R, mode=Mode.SUBTRACT)
    extrude(amount=-BAROMETER_MOUNT_DEPTH)

    # All tabs extrude sideways: up to this face of the body (flat: up to its plane)
    all_tabs_extrude_sideways_end = Plane(part.part.faces().sort_by_distance((-18.166447268, 28.59721894, -2))[0])
    # Sketch11 → All tabs extrude sideways (add, up to the picked face)
    with BuildSketch(Plane(origin=(0, 0, -9), x_dir=(-1, 0, 0), z_dir=(0, 0, -1)), mode=Mode.PRIVATE) as all_tabs_extrude_sideways_sk1:
        with Locations((-26.25, 42.75)):
            Rectangle(SKETCH11_W, SKETCH11_H)
    all_tabs_extrude_sideways_tool1 = split(extrude(all_tabs_extrude_sideways_sk1.sketch, amount=-ALL_TABS_EXTRUDE_SIDEWAYS_REACH, mode=Mode.PRIVATE), bisect_by=all_tabs_extrude_sideways_end, keep=Keep.BOTH, mode=Mode.PRIVATE)
    # Sketch11 → All tabs extrude sideways (add, up to the picked face)
    with BuildSketch(Plane(origin=(0, 0, -9), x_dir=(-1, 0, 0), z_dir=(0, 0, -1)), mode=Mode.PRIVATE) as all_tabs_extrude_sideways_sk2:
        with Locations((-26.25, 15.25)):
            Rectangle(SKETCH11_W, SKETCH11_H)
    all_tabs_extrude_sideways_tool2 = split(extrude(all_tabs_extrude_sideways_sk2.sketch, amount=-ALL_TABS_EXTRUDE_SIDEWAYS_REACH, mode=Mode.PRIVATE), bisect_by=all_tabs_extrude_sideways_end, keep=Keep.BOTH, mode=Mode.PRIVATE)
    # Sketch11 → All tabs extrude sideways (add, up to the picked face)
    with BuildSketch(Plane(origin=(0, 0, -9), x_dir=(-1, 0, 0), z_dir=(0, 0, -1)), mode=Mode.PRIVATE) as all_tabs_extrude_sideways_sk3:
        with Locations((26.25, 15.25)):
            Rectangle(SKETCH11_W, SKETCH11_H)
    all_tabs_extrude_sideways_tool3 = split(extrude(all_tabs_extrude_sideways_sk3.sketch, amount=-ALL_TABS_EXTRUDE_SIDEWAYS_REACH, mode=Mode.PRIVATE), bisect_by=all_tabs_extrude_sideways_end, keep=Keep.BOTH, mode=Mode.PRIVATE)
    # Sketch11 → All tabs extrude sideways (add, up to the picked face)
    with BuildSketch(Plane(origin=(0, 0, -9), x_dir=(-1, 0, 0), z_dir=(0, 0, -1)), mode=Mode.PRIVATE) as all_tabs_extrude_sideways_sk4:
        with Locations((26.25, 42.75)):
            Rectangle(SKETCH11_W, SKETCH11_H)
    all_tabs_extrude_sideways_tool4 = split(extrude(all_tabs_extrude_sideways_sk4.sketch, amount=-ALL_TABS_EXTRUDE_SIDEWAYS_REACH, mode=Mode.PRIVATE), bisect_by=all_tabs_extrude_sideways_end, keep=Keep.BOTH, mode=Mode.PRIVATE)
    add(all_tabs_extrude_sideways_tool1.solids().sort_by(Axis((26.25, 42.75, -9), (0, 0, 1)))[0])
    add(all_tabs_extrude_sideways_tool2.solids().sort_by(Axis((26.25, 15.25, -9), (0, 0, 1)))[0])
    add(all_tabs_extrude_sideways_tool3.solids().sort_by(Axis((-26.25, 15.25, -9), (0, 0, 1)))[0])
    add(all_tabs_extrude_sideways_tool4.solids().sort_by(Axis((-26.25, 42.75, -9), (0, 0, 1)))[0])

    # Sketch14 → Screwhole cut (cut, two sides: drawn at the far end of the back side and taken through both)
    with BuildSketch(Plane(origin=(0, 43.5, 0), x_dir=(1, 0, 0), z_dir=(0, 1, 0)).offset(-SCREWHOLE_CUT_DEPTH_BACK)):
        with Locations(Location((-26.5, 5.5, 0), (0, 0, 90))):
            Circle(SKETCH14_R)
        with Locations(Location((26.5, 5.5, 0), (0, 0, 270))):
            Circle(SKETCH14_R)
    extrude(amount=SCREWHOLE_CUT_DEPTH + SCREWHOLE_CUT_DEPTH_BACK, mode=Mode.SUBTRACT)

    # Screwhole tab fillets
    screwhole_tab_fillets_edges = [part.edges().sort_by_distance(p)[0] for p in [
        (29, 42.75, -9),
        (29, 42.75, -2),
        (29, 15.25, -9),
        (29, 15.25, -2),
        (-29, 15.25, -9),
        (-29, 15.25, -2),
        (-29, 42.75, -9),
        (-29, 42.75, -2),
    ]]
    fillet(screwhole_tab_fillets_edges, radius=SCREWHOLE_TAB_FILLETS_R)


solid = part.part
